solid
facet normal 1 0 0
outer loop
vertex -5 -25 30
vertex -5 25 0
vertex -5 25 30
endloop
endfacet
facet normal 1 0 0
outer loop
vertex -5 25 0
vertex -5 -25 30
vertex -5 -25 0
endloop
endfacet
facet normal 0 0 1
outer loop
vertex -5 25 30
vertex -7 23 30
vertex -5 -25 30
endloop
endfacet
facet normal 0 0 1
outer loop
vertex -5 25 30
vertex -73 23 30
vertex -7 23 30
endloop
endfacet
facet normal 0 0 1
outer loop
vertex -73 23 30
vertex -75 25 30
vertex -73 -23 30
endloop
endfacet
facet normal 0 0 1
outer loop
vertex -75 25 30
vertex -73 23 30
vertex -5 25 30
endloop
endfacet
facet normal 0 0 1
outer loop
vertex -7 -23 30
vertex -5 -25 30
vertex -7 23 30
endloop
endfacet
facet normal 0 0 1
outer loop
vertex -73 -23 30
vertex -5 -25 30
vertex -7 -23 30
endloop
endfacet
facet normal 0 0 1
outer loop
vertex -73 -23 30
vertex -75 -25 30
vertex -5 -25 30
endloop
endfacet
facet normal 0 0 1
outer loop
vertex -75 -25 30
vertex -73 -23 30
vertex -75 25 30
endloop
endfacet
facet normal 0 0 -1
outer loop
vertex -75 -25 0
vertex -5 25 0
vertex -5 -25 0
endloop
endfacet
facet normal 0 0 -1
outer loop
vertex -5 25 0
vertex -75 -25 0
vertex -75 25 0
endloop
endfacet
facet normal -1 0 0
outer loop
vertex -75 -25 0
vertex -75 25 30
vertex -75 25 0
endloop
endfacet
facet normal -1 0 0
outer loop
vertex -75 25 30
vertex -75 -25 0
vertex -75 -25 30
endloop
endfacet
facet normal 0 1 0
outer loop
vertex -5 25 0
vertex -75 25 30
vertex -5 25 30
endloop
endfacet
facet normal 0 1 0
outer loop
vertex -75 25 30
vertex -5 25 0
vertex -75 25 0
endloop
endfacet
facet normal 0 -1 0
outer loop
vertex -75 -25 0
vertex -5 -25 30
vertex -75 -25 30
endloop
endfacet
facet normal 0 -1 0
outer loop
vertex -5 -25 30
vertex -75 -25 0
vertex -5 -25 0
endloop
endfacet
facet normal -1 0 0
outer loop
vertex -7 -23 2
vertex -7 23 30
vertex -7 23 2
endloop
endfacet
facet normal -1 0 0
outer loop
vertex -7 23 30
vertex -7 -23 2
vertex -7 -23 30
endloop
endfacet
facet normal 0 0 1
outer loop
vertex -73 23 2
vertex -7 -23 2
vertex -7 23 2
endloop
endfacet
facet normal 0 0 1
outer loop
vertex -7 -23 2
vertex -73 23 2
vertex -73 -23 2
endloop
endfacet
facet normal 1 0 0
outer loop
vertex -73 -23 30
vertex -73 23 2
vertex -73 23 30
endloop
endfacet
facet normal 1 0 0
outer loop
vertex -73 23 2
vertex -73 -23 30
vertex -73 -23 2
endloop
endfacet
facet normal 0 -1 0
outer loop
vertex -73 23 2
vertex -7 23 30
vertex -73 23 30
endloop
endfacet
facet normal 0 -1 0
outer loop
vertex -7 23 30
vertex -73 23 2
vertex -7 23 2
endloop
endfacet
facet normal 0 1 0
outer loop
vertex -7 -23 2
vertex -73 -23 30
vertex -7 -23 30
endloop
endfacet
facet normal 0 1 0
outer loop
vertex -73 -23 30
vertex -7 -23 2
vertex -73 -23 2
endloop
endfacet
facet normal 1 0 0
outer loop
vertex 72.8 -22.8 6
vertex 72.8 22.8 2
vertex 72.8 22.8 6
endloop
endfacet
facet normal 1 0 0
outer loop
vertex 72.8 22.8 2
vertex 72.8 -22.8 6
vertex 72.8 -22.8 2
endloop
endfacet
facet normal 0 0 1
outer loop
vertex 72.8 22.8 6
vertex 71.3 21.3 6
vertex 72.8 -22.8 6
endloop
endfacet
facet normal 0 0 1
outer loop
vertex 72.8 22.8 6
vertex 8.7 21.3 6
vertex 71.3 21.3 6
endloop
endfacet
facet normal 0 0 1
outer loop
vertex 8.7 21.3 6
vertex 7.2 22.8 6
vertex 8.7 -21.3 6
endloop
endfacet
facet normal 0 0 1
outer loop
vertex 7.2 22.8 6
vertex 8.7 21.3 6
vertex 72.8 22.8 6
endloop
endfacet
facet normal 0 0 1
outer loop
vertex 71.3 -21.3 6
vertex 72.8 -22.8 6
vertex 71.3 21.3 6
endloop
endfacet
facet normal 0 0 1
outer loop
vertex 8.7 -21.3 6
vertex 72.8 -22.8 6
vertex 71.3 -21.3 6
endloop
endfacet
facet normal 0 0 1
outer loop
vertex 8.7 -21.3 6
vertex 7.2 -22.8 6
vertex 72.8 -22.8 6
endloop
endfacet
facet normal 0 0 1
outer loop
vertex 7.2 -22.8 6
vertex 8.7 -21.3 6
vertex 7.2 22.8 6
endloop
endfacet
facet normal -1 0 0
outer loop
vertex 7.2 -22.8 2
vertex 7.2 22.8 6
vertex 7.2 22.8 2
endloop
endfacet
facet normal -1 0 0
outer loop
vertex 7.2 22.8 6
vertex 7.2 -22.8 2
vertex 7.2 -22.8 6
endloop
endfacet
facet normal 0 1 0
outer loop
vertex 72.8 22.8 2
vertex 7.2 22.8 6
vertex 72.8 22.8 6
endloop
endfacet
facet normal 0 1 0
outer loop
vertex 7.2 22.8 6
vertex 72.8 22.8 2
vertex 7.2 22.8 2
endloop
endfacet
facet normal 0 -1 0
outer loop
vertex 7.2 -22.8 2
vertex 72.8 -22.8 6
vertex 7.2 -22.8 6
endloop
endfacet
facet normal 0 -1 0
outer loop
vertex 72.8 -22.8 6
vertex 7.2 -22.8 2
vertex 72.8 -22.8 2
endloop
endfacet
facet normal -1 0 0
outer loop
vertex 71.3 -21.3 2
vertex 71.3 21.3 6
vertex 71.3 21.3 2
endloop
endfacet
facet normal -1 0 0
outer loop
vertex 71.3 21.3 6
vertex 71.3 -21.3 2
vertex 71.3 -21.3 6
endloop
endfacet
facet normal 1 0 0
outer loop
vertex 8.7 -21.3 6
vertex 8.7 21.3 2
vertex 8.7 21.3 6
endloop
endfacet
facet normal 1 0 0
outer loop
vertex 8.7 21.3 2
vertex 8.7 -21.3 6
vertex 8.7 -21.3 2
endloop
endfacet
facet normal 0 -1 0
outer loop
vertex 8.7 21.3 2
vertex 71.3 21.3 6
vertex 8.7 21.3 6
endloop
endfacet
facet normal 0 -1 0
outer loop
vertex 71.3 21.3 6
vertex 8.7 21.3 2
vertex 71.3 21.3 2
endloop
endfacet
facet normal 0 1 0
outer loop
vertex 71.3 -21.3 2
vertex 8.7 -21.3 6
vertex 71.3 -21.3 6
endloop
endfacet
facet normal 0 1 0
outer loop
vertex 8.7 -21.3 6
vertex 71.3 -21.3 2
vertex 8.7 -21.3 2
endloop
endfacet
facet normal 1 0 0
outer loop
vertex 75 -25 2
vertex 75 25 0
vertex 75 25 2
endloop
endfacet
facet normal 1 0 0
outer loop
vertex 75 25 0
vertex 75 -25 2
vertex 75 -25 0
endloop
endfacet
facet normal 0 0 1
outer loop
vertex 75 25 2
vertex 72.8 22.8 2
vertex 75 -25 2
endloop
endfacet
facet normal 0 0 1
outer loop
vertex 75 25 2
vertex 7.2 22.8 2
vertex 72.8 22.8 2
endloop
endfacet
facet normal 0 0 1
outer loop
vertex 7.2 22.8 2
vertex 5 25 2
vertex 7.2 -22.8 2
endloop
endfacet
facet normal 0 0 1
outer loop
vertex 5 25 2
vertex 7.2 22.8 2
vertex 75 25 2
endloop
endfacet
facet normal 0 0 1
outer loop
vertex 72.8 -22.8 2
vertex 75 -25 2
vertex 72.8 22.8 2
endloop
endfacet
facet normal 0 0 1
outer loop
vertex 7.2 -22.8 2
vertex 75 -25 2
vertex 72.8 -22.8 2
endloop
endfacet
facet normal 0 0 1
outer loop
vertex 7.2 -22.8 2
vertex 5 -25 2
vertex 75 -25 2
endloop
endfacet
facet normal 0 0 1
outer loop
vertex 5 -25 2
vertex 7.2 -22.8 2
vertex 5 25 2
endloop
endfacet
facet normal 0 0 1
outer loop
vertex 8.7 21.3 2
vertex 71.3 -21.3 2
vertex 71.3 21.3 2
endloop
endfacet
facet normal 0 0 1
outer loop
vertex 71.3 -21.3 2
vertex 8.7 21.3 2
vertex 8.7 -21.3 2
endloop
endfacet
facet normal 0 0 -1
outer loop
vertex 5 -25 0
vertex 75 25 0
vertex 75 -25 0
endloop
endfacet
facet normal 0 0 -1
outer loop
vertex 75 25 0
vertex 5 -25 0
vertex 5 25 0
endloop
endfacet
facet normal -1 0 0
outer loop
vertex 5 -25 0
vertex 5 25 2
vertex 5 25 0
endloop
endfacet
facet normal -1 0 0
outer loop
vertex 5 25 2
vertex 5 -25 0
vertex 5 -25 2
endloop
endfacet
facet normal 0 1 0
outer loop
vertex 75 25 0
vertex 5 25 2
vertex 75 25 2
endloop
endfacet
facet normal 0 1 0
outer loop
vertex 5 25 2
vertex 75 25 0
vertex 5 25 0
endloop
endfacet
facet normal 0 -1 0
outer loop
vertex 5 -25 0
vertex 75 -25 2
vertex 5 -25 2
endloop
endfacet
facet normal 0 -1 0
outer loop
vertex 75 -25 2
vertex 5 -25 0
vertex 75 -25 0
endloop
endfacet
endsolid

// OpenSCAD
// Two-part enclosure: open-top box + upside-down lid, printed side by side
// Units: mm

$fn = 64;

// ---------- Box ----------
box_x      = 70;    // box outer length (X)
box_y      = 50;    // box outer width (Y)
box_z      = 30;    // box outer height (Z)
wall       = 2;     // box wall thickness
floor_t    = 2;     // box floor thickness

// ---------- Lid ----------
lid_x      = 70;    // lid plate length (X)
lid_y      = 50;    // lid plate width (Y)
lid_t      = 2;     // lid plate thickness
lip_x      = 65.6;  // lip outer length (X)
lip_y      = 45.6;  // lip outer width (Y)
lip_wall   = 1.5;   // lip wall thickness
lip_h      = 4;     // lip height above plate

// ---------- Layout ----------
gap        = 10;    // gap between parts on the bed
eps        = 0.5;   // cutter overshoot past faces

// Centre the pair on the origin in X
total_x    = box_x + gap + lid_x;
box_cx     = -total_x/2 + box_x/2;          // box centre X
lid_cx     =  total_x/2 - lid_x/2;          // lid centre X (+X side)

// ---------- Part 1: box ----------
module box() {
    difference() {
        translate([-box_x/2, -box_y/2, 0])
            cube([box_x, box_y, box_z]);
        // inner cavity, open top
        translate([-(box_x - 2*wall)/2, -(box_y - 2*wall)/2, floor_t])
            cube([box_x - 2*wall, box_y - 2*wall, box_z - floor_t + eps]);
    }
}

// ---------- Part 2: lid (upside down) ----------
module lid() {
    union() {
        // plate on the bed
        translate([-lid_x/2, -lid_y/2, 0])
            cube([lid_x, lid_y, lid_t]);
        // rectangular lip on top of plate
        difference() {
            translate([-lip_x/2, -lip_y/2, lid_t - 0.01])
                cube([lip_x, lip_y, lip_h + 0.01]);
            translate([-(lip_x - 2*lip_wall)/2, -(lip_y - 2*lip_wall)/2, lid_t - eps])
                cube([lip_x - 2*lip_wall, lip_y - 2*lip_wall, lip_h + 2*eps]);
        }
    }
}

// ---------- Assembly on the bed ----------
translate([box_cx, 0, 0]) box();
translate([lid_cx, 0, 0]) lid();
